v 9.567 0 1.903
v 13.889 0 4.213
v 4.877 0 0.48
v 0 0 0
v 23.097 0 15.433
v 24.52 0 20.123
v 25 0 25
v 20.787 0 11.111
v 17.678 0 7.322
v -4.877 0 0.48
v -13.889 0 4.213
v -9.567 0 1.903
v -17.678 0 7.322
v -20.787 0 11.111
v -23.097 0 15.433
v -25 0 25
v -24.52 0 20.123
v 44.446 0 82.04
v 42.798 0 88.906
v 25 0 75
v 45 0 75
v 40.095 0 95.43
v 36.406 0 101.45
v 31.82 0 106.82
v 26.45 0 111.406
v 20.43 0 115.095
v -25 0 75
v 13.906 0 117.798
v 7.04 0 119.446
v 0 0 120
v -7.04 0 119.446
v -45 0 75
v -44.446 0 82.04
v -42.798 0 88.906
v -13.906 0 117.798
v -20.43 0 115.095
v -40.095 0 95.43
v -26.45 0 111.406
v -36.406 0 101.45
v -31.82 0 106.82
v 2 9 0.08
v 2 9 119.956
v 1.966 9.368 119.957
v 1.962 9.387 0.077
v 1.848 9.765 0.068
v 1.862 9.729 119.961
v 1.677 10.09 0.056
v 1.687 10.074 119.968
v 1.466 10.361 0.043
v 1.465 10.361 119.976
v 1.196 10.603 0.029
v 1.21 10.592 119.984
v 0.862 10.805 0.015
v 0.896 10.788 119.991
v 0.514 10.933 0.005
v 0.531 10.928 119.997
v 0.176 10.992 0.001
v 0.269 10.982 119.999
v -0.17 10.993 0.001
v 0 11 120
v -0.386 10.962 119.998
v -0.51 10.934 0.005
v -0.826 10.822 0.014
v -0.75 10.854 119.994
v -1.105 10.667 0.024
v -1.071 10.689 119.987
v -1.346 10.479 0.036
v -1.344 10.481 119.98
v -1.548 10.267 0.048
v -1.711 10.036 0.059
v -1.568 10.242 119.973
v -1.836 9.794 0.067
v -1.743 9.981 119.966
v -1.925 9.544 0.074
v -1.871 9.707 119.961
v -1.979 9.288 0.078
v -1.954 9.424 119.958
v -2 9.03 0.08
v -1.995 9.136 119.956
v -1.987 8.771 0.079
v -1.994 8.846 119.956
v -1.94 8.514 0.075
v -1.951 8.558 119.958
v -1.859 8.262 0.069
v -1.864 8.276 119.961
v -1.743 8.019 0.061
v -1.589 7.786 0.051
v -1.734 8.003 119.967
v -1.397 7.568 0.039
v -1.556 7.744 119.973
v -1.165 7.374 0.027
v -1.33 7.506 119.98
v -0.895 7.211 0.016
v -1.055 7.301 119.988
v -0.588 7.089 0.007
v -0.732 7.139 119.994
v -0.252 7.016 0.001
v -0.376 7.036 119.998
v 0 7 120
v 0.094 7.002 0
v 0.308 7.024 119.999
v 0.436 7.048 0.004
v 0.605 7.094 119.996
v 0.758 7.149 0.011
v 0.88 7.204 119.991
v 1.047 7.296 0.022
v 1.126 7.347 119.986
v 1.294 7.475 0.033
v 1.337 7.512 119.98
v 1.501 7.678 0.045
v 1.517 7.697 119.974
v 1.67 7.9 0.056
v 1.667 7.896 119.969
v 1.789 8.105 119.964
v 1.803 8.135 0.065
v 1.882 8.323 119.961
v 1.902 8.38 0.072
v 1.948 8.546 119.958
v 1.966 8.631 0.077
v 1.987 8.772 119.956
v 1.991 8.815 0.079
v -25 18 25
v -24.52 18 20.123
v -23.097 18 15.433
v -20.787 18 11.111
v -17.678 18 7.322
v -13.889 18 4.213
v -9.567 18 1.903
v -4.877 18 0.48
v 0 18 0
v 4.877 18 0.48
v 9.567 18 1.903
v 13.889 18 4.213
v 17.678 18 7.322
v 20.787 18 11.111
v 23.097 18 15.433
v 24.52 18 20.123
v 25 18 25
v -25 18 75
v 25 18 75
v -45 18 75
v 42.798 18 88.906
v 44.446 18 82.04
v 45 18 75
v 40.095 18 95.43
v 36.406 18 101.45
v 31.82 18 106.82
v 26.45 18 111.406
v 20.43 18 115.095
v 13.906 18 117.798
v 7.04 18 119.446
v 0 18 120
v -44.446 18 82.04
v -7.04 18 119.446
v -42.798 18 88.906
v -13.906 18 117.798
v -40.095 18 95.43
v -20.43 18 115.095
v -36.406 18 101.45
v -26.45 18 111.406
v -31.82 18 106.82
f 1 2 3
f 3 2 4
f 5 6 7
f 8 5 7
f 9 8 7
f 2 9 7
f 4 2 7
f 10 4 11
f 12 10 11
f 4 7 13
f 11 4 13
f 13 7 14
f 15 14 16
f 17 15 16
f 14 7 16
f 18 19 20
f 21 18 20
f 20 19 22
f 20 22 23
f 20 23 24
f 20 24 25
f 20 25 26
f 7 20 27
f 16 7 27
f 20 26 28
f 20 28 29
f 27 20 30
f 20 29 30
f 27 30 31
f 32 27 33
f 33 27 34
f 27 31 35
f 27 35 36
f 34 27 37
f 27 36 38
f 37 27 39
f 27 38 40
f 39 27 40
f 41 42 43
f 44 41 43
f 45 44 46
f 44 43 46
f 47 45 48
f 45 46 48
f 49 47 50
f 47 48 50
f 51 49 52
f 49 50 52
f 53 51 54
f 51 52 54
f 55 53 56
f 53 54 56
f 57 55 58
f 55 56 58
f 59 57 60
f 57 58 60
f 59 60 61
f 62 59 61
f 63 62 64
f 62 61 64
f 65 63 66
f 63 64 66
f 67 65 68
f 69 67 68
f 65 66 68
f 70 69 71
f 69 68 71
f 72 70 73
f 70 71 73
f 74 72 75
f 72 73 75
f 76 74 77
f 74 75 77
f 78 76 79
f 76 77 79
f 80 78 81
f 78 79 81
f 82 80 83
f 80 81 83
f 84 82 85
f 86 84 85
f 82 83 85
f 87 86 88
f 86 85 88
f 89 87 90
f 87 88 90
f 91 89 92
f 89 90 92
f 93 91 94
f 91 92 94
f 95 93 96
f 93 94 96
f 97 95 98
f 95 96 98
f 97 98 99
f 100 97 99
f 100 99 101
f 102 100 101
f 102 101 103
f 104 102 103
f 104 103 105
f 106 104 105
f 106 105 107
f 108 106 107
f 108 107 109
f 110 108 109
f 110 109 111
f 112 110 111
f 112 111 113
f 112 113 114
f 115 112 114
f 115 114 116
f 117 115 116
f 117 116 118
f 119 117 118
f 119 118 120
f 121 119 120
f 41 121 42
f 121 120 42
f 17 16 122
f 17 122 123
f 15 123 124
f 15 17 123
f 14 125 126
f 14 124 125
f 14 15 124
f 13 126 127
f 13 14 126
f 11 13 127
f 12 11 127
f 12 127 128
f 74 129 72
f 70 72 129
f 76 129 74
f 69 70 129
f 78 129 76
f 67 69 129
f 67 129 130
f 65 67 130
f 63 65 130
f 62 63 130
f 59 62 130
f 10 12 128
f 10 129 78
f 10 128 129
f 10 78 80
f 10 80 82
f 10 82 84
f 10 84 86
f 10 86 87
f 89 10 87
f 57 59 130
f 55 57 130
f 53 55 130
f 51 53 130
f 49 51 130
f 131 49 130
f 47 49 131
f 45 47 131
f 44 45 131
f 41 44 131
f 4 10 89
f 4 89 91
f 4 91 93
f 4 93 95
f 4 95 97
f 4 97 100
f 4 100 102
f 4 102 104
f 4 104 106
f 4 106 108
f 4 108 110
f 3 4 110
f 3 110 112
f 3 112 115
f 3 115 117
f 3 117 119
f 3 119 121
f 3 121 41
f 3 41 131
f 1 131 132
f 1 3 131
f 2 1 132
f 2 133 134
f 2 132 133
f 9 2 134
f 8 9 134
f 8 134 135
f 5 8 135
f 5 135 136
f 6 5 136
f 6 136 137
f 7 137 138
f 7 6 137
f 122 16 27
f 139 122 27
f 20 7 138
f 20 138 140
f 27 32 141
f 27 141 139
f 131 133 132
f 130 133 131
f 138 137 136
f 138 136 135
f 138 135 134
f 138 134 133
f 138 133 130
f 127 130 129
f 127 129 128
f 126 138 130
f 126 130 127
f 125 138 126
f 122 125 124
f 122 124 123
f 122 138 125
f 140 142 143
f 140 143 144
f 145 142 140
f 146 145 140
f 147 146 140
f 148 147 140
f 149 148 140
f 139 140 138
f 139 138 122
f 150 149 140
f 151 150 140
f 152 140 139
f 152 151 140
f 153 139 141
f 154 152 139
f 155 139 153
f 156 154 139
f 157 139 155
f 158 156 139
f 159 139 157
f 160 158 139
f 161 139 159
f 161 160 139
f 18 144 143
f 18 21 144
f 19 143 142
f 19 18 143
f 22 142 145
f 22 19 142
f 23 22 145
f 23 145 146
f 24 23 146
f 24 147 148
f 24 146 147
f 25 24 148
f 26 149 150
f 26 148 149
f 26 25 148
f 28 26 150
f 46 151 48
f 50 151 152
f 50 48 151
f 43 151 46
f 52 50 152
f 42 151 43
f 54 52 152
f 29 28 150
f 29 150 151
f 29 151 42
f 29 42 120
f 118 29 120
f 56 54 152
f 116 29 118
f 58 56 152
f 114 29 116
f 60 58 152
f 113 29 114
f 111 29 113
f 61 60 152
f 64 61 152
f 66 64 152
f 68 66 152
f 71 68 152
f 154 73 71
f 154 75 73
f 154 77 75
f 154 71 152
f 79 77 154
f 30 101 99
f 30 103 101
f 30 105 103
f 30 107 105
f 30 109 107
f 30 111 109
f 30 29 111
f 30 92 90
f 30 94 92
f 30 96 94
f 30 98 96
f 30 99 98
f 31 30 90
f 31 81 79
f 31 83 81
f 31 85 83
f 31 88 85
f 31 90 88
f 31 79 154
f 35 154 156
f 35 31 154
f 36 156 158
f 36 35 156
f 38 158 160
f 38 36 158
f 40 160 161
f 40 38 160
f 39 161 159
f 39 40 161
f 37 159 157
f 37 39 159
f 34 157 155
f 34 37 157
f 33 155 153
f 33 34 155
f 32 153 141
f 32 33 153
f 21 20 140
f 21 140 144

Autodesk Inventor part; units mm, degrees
ref_plane "YZ Plane" through (0, 0, 0) normal (1, 0, 0) x (0, 1, 0)
ref_plane "XZ Plane" through (0, 0, 0) normal (0, 1, 0) x (-1, 0, 0)
sketch "Boceto1" plane through (0, 0, 0) normal (0, 1, 0) x (-1, 0, 0)
  arc A0 (-25, 25) -> (25, 25) centre (0, 25) ccw
  arc A1 (45, 75) -> (-45, 75) centre (0, 75) ccw
  line L0 (25, 25) -> (25, 75)
  line L1 (-25, 25) -> (-25, 75)
  line L2 (45, 75) -> (25, 75)
  line L3 (-25, 75) -> (-45, 75)
  point P0 (0, 0)
  dimension "d3" = 50
  dimension "d4" = 90
extrude "Extrusión1" add sketch "Boceto1" along normal blind 18
ref_plane "Plano de trabajo2" through (0, 0, 120) normal (0, 0, -1) x (-1, 0, 0)
sketch "Boceto3" plane through (0, 0, 120) normal (0, 0, -1) x (-1, 0, 0)
  circle A0 centre (0, 9) radius 2
  line L0 (45, 18) -> (-45, 18) projected
  point P0 (0, 0)
  dimension "d13" = 4
  dimension "d14" = 9
extrude "Extrusión3" add sketch "Boceto3" against normal blind 2
sketch "Boceto4" plane through (0, 9, 122) normal (0, 0, 1) x (1, 0, 0)
  circle A0 centre (0, 0) radius 2
  point P0 (0, -9)
  dimension "d17" = 4
extrude "Extrusión4" cut sketch "Boceto4" against normal blind 157.75
properties part number "APM_001-1"
